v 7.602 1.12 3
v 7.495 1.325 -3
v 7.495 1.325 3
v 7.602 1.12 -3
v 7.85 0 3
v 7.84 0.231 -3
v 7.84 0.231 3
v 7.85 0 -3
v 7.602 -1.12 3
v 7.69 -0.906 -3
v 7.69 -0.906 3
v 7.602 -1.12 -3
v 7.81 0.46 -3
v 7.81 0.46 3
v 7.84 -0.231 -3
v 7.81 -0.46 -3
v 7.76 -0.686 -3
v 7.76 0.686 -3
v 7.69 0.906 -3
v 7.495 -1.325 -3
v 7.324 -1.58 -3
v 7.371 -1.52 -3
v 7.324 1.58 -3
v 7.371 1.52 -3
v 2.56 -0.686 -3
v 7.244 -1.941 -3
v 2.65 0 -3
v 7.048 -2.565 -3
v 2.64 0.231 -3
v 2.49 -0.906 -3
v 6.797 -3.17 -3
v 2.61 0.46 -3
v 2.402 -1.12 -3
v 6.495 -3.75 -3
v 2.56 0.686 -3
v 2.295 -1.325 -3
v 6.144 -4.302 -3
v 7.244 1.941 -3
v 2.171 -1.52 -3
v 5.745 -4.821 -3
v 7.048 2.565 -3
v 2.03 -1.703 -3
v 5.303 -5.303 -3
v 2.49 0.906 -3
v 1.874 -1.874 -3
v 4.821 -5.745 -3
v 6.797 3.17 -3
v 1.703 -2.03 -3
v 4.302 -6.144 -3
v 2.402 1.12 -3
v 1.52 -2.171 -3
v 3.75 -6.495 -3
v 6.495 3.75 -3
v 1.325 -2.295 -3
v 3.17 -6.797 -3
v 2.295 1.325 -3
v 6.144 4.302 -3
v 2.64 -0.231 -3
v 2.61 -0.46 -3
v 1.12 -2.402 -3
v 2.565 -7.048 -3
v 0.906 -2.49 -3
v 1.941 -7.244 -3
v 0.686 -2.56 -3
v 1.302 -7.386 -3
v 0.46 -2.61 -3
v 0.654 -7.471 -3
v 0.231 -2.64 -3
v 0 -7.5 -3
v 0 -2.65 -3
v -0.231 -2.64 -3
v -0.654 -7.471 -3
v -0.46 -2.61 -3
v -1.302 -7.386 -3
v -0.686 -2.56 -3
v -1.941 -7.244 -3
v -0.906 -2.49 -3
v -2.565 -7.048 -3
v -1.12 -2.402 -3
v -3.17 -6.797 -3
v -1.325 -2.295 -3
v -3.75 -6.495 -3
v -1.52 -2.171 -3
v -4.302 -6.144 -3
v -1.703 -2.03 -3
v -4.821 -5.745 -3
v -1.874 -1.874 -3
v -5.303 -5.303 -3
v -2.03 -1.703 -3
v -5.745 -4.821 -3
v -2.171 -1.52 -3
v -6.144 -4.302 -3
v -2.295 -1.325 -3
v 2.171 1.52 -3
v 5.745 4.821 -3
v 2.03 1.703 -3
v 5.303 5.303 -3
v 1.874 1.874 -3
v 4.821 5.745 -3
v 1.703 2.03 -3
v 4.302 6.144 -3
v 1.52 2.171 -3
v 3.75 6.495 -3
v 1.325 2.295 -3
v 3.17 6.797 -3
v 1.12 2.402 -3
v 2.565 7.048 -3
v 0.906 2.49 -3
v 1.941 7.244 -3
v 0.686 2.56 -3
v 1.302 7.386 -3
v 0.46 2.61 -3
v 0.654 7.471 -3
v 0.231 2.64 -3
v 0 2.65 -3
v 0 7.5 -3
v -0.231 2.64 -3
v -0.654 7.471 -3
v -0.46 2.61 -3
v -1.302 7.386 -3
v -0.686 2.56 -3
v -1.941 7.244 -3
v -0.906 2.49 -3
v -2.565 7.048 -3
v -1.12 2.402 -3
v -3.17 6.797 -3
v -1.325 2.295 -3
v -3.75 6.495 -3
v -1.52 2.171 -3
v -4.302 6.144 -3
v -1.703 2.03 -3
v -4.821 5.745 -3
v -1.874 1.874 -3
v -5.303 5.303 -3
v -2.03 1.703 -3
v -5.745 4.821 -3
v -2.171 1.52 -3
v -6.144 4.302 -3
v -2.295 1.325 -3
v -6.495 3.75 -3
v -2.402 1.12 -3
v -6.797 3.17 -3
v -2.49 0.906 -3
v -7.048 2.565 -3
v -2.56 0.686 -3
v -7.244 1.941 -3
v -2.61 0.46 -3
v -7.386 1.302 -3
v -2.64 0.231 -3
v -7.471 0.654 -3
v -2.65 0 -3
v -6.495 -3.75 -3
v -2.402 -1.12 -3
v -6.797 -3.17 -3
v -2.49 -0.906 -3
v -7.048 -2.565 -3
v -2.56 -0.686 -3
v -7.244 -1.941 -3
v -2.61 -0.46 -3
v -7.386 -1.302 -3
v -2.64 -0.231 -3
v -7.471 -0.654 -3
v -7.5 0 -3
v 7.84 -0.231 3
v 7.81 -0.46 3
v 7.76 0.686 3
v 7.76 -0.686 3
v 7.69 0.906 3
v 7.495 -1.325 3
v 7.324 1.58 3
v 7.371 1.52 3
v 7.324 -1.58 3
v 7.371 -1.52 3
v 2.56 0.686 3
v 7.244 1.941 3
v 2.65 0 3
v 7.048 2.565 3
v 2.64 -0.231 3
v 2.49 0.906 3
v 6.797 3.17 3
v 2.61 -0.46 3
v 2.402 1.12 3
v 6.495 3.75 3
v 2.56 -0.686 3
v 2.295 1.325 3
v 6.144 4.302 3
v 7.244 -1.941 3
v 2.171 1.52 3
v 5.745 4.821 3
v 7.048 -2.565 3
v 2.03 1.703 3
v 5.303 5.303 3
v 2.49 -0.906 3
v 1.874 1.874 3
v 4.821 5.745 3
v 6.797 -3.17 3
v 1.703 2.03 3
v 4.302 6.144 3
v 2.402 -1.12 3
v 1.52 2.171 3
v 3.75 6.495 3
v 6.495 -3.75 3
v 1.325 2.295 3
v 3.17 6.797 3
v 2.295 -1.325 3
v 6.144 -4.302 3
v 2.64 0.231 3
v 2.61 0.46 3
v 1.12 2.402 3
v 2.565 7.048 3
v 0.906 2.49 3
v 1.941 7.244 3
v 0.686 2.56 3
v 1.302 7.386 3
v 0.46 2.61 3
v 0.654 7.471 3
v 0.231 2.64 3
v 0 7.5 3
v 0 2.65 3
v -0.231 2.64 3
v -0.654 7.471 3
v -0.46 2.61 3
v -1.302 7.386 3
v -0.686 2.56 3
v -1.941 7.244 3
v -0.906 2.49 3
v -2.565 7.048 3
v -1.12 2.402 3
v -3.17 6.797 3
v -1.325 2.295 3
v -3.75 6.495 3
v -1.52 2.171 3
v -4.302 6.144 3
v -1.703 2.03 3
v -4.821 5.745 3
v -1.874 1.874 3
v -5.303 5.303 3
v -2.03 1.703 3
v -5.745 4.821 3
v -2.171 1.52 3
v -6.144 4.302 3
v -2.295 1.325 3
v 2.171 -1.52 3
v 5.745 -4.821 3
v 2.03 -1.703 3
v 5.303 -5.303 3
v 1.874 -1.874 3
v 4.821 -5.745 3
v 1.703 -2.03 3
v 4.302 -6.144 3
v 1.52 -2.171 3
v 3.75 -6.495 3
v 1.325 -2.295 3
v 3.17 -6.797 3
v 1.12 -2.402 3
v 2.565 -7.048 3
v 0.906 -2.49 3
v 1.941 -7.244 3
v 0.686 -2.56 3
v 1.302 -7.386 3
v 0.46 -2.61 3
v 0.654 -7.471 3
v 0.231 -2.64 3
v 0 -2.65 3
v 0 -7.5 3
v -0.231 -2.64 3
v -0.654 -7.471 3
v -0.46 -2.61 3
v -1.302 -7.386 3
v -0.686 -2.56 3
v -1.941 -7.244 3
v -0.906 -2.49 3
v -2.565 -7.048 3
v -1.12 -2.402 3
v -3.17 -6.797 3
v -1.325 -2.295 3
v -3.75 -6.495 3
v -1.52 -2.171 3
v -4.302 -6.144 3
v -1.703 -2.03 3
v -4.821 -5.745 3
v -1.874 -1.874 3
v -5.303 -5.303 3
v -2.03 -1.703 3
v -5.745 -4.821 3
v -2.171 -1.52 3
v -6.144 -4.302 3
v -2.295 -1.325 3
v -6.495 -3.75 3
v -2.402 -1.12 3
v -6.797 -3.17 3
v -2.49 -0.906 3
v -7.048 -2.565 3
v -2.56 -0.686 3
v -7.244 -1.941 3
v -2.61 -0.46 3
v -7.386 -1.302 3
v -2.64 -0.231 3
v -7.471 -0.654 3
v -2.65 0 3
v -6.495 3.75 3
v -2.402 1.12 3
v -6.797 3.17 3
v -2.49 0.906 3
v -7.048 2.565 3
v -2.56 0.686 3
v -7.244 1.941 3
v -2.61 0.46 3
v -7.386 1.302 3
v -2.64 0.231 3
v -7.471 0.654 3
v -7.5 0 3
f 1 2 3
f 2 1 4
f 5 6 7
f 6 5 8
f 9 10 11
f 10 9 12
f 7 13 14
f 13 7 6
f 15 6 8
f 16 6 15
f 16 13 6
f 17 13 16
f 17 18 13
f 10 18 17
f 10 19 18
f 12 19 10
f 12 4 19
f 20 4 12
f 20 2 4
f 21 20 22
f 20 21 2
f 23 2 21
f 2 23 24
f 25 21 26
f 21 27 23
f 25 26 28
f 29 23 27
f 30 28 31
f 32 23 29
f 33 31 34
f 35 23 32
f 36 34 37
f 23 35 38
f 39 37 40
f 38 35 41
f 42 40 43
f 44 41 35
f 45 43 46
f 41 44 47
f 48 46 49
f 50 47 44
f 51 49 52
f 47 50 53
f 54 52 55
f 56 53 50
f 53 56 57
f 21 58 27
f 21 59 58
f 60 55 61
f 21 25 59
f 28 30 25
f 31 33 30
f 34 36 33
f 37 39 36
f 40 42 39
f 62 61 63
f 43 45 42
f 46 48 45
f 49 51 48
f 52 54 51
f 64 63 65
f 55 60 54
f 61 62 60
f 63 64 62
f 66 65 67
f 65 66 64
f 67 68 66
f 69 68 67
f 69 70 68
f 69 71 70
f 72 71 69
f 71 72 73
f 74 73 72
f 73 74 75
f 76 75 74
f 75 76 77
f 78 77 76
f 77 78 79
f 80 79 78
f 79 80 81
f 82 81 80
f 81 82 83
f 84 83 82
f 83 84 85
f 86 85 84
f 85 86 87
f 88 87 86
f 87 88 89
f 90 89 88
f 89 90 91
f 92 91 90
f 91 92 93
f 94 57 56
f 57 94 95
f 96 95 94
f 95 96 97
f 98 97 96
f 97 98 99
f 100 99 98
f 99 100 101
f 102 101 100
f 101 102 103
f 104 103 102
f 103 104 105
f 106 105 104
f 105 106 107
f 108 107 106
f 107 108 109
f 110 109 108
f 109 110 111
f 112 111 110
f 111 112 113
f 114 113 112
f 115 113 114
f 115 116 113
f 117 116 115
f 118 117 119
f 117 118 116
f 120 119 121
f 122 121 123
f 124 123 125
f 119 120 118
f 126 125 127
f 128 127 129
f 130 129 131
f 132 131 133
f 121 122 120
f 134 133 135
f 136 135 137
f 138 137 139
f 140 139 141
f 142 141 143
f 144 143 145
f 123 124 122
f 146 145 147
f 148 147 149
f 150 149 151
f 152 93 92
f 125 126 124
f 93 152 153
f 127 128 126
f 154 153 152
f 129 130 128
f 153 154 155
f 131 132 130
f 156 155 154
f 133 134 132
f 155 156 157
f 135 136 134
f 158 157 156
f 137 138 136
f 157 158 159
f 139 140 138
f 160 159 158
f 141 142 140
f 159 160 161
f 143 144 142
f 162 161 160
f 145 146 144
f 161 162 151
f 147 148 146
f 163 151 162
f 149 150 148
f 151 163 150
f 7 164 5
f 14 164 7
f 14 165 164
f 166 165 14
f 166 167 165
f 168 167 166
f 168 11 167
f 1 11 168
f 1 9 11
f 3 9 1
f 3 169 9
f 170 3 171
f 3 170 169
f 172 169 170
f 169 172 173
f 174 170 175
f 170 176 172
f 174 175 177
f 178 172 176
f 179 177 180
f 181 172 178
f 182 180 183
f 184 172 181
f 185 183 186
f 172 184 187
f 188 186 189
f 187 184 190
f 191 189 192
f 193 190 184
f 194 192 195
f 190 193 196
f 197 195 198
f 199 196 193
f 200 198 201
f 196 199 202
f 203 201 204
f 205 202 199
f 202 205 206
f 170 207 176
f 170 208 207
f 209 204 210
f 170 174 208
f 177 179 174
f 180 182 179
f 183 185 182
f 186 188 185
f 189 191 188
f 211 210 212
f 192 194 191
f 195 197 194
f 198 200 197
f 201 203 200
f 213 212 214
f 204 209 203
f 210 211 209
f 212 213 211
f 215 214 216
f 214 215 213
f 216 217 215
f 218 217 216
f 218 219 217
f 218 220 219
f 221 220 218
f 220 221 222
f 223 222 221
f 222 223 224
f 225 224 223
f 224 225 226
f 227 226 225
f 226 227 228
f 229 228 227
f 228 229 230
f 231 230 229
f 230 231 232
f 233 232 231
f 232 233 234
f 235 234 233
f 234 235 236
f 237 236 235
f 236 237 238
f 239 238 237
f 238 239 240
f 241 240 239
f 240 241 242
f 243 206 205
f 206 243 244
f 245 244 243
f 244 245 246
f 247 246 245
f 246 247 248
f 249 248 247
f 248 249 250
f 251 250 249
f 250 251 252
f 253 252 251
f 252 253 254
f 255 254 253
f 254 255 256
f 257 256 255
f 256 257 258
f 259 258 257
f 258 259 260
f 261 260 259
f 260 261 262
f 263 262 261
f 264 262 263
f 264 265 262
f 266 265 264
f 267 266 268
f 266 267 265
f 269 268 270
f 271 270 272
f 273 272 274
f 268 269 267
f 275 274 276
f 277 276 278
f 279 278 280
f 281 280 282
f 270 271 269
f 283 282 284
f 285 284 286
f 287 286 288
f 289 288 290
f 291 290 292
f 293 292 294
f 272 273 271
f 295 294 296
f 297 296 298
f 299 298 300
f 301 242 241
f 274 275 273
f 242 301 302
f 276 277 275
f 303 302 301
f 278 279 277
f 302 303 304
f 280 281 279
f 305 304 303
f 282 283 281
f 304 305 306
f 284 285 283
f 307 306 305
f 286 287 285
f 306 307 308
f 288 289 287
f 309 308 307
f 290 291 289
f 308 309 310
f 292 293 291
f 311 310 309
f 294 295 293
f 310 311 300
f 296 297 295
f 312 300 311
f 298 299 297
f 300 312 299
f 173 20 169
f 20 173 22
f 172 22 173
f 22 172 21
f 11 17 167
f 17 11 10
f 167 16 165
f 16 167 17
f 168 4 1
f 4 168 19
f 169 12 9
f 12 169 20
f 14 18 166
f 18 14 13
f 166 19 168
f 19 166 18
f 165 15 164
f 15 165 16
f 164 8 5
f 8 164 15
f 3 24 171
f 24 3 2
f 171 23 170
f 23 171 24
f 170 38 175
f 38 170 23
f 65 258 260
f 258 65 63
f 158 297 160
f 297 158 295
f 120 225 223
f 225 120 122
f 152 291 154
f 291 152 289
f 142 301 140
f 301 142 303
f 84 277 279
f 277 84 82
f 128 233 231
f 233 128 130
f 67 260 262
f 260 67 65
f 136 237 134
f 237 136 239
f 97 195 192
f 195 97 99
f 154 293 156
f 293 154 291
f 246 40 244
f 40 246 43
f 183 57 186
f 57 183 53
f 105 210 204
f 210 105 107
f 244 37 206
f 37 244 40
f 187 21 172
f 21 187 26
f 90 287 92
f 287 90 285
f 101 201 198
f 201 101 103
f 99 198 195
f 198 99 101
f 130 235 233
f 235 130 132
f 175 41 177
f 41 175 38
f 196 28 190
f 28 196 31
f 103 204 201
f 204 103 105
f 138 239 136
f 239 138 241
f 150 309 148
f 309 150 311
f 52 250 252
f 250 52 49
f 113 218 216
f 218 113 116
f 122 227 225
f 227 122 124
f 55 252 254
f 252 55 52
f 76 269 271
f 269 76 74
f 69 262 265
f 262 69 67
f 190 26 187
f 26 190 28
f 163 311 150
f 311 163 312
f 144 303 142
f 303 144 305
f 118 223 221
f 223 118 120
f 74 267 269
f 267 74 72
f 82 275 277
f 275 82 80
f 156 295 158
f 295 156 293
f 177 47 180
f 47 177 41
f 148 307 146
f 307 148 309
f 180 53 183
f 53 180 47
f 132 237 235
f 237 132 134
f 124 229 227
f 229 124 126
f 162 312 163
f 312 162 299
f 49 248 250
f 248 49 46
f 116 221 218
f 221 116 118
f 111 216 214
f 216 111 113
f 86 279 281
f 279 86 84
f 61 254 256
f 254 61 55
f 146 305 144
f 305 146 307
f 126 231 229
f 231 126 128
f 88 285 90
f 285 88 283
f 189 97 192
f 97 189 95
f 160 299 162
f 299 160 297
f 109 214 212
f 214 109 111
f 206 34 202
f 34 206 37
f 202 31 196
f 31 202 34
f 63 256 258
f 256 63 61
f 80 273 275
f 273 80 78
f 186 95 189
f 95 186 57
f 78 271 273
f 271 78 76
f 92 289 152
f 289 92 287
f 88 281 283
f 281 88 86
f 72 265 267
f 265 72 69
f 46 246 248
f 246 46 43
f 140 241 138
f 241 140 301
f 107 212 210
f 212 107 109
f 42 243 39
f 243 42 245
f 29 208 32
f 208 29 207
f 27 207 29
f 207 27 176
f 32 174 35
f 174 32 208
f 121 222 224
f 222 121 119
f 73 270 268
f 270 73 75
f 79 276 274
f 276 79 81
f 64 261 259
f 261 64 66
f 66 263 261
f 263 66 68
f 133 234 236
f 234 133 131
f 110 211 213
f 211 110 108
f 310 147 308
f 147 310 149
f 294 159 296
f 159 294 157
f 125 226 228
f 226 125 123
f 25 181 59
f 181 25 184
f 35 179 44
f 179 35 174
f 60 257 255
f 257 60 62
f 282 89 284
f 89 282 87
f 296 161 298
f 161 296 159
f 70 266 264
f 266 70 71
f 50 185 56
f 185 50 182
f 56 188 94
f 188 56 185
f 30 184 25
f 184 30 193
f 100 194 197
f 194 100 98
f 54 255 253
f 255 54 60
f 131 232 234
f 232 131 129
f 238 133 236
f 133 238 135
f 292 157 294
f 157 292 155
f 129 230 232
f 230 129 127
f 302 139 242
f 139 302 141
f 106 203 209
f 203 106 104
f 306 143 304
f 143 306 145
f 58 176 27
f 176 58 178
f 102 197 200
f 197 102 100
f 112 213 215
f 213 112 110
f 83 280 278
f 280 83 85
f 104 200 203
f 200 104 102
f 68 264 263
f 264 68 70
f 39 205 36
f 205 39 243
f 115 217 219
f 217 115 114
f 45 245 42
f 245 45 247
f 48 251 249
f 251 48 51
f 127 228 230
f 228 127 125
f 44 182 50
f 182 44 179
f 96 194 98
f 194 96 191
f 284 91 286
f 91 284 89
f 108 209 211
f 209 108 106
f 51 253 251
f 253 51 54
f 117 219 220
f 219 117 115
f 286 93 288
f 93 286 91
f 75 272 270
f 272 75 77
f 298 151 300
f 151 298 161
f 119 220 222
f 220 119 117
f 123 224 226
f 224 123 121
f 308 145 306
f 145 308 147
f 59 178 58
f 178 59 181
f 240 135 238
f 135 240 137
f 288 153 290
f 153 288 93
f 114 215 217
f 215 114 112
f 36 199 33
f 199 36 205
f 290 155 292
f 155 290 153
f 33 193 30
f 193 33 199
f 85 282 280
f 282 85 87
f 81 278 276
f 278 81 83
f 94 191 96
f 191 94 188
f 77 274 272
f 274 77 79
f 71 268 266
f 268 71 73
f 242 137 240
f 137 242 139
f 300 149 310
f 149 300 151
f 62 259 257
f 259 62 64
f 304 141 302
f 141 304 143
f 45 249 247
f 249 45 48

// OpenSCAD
// K'NEX Grey 1-Way End Cap Connector
$fn = 72;

hub_r = 7.5;
hub_h = 6.0;
arm_w = 5.3;
arm_h = 6.0;
arm_len = 12.7;
hole_r = 2.65;
slot_w = 1.2;

module arm() {
    difference() {
        // Rounded arm body
        hull() {
            cylinder(h=arm_h, r=arm_w/2, center=true);
            translate([arm_len - hub_r, 0, 0])
                cylinder(h=arm_h, r=arm_w/2, center=true);
        }
        // Rod hole at the tip
        translate([arm_len, 0, 0])
            cylinder(h=arm_h+2, r=hole_r, center=true);
        // Side clip slots (top and bottom entry)
        translate([arm_len, 0, 0]) {
            translate([0, 0, arm_h/2])
                cube([slot_w, hole_r*2+1, 2], center=true);
            translate([0, 0, -arm_h/2])
                cube([slot_w, hole_r*2+1, 2], center=true);
        }
    }
}

module connector_1way() {
    difference() {
        union() {
            // Hub
            cylinder(h=hub_h, r=hub_r, center=true);
            // Single arm
            arm();
        }
        // Center axle hole
        cylinder(h=hub_h+2, r=hole_r, center=true);
    }
}

connector_1way();
